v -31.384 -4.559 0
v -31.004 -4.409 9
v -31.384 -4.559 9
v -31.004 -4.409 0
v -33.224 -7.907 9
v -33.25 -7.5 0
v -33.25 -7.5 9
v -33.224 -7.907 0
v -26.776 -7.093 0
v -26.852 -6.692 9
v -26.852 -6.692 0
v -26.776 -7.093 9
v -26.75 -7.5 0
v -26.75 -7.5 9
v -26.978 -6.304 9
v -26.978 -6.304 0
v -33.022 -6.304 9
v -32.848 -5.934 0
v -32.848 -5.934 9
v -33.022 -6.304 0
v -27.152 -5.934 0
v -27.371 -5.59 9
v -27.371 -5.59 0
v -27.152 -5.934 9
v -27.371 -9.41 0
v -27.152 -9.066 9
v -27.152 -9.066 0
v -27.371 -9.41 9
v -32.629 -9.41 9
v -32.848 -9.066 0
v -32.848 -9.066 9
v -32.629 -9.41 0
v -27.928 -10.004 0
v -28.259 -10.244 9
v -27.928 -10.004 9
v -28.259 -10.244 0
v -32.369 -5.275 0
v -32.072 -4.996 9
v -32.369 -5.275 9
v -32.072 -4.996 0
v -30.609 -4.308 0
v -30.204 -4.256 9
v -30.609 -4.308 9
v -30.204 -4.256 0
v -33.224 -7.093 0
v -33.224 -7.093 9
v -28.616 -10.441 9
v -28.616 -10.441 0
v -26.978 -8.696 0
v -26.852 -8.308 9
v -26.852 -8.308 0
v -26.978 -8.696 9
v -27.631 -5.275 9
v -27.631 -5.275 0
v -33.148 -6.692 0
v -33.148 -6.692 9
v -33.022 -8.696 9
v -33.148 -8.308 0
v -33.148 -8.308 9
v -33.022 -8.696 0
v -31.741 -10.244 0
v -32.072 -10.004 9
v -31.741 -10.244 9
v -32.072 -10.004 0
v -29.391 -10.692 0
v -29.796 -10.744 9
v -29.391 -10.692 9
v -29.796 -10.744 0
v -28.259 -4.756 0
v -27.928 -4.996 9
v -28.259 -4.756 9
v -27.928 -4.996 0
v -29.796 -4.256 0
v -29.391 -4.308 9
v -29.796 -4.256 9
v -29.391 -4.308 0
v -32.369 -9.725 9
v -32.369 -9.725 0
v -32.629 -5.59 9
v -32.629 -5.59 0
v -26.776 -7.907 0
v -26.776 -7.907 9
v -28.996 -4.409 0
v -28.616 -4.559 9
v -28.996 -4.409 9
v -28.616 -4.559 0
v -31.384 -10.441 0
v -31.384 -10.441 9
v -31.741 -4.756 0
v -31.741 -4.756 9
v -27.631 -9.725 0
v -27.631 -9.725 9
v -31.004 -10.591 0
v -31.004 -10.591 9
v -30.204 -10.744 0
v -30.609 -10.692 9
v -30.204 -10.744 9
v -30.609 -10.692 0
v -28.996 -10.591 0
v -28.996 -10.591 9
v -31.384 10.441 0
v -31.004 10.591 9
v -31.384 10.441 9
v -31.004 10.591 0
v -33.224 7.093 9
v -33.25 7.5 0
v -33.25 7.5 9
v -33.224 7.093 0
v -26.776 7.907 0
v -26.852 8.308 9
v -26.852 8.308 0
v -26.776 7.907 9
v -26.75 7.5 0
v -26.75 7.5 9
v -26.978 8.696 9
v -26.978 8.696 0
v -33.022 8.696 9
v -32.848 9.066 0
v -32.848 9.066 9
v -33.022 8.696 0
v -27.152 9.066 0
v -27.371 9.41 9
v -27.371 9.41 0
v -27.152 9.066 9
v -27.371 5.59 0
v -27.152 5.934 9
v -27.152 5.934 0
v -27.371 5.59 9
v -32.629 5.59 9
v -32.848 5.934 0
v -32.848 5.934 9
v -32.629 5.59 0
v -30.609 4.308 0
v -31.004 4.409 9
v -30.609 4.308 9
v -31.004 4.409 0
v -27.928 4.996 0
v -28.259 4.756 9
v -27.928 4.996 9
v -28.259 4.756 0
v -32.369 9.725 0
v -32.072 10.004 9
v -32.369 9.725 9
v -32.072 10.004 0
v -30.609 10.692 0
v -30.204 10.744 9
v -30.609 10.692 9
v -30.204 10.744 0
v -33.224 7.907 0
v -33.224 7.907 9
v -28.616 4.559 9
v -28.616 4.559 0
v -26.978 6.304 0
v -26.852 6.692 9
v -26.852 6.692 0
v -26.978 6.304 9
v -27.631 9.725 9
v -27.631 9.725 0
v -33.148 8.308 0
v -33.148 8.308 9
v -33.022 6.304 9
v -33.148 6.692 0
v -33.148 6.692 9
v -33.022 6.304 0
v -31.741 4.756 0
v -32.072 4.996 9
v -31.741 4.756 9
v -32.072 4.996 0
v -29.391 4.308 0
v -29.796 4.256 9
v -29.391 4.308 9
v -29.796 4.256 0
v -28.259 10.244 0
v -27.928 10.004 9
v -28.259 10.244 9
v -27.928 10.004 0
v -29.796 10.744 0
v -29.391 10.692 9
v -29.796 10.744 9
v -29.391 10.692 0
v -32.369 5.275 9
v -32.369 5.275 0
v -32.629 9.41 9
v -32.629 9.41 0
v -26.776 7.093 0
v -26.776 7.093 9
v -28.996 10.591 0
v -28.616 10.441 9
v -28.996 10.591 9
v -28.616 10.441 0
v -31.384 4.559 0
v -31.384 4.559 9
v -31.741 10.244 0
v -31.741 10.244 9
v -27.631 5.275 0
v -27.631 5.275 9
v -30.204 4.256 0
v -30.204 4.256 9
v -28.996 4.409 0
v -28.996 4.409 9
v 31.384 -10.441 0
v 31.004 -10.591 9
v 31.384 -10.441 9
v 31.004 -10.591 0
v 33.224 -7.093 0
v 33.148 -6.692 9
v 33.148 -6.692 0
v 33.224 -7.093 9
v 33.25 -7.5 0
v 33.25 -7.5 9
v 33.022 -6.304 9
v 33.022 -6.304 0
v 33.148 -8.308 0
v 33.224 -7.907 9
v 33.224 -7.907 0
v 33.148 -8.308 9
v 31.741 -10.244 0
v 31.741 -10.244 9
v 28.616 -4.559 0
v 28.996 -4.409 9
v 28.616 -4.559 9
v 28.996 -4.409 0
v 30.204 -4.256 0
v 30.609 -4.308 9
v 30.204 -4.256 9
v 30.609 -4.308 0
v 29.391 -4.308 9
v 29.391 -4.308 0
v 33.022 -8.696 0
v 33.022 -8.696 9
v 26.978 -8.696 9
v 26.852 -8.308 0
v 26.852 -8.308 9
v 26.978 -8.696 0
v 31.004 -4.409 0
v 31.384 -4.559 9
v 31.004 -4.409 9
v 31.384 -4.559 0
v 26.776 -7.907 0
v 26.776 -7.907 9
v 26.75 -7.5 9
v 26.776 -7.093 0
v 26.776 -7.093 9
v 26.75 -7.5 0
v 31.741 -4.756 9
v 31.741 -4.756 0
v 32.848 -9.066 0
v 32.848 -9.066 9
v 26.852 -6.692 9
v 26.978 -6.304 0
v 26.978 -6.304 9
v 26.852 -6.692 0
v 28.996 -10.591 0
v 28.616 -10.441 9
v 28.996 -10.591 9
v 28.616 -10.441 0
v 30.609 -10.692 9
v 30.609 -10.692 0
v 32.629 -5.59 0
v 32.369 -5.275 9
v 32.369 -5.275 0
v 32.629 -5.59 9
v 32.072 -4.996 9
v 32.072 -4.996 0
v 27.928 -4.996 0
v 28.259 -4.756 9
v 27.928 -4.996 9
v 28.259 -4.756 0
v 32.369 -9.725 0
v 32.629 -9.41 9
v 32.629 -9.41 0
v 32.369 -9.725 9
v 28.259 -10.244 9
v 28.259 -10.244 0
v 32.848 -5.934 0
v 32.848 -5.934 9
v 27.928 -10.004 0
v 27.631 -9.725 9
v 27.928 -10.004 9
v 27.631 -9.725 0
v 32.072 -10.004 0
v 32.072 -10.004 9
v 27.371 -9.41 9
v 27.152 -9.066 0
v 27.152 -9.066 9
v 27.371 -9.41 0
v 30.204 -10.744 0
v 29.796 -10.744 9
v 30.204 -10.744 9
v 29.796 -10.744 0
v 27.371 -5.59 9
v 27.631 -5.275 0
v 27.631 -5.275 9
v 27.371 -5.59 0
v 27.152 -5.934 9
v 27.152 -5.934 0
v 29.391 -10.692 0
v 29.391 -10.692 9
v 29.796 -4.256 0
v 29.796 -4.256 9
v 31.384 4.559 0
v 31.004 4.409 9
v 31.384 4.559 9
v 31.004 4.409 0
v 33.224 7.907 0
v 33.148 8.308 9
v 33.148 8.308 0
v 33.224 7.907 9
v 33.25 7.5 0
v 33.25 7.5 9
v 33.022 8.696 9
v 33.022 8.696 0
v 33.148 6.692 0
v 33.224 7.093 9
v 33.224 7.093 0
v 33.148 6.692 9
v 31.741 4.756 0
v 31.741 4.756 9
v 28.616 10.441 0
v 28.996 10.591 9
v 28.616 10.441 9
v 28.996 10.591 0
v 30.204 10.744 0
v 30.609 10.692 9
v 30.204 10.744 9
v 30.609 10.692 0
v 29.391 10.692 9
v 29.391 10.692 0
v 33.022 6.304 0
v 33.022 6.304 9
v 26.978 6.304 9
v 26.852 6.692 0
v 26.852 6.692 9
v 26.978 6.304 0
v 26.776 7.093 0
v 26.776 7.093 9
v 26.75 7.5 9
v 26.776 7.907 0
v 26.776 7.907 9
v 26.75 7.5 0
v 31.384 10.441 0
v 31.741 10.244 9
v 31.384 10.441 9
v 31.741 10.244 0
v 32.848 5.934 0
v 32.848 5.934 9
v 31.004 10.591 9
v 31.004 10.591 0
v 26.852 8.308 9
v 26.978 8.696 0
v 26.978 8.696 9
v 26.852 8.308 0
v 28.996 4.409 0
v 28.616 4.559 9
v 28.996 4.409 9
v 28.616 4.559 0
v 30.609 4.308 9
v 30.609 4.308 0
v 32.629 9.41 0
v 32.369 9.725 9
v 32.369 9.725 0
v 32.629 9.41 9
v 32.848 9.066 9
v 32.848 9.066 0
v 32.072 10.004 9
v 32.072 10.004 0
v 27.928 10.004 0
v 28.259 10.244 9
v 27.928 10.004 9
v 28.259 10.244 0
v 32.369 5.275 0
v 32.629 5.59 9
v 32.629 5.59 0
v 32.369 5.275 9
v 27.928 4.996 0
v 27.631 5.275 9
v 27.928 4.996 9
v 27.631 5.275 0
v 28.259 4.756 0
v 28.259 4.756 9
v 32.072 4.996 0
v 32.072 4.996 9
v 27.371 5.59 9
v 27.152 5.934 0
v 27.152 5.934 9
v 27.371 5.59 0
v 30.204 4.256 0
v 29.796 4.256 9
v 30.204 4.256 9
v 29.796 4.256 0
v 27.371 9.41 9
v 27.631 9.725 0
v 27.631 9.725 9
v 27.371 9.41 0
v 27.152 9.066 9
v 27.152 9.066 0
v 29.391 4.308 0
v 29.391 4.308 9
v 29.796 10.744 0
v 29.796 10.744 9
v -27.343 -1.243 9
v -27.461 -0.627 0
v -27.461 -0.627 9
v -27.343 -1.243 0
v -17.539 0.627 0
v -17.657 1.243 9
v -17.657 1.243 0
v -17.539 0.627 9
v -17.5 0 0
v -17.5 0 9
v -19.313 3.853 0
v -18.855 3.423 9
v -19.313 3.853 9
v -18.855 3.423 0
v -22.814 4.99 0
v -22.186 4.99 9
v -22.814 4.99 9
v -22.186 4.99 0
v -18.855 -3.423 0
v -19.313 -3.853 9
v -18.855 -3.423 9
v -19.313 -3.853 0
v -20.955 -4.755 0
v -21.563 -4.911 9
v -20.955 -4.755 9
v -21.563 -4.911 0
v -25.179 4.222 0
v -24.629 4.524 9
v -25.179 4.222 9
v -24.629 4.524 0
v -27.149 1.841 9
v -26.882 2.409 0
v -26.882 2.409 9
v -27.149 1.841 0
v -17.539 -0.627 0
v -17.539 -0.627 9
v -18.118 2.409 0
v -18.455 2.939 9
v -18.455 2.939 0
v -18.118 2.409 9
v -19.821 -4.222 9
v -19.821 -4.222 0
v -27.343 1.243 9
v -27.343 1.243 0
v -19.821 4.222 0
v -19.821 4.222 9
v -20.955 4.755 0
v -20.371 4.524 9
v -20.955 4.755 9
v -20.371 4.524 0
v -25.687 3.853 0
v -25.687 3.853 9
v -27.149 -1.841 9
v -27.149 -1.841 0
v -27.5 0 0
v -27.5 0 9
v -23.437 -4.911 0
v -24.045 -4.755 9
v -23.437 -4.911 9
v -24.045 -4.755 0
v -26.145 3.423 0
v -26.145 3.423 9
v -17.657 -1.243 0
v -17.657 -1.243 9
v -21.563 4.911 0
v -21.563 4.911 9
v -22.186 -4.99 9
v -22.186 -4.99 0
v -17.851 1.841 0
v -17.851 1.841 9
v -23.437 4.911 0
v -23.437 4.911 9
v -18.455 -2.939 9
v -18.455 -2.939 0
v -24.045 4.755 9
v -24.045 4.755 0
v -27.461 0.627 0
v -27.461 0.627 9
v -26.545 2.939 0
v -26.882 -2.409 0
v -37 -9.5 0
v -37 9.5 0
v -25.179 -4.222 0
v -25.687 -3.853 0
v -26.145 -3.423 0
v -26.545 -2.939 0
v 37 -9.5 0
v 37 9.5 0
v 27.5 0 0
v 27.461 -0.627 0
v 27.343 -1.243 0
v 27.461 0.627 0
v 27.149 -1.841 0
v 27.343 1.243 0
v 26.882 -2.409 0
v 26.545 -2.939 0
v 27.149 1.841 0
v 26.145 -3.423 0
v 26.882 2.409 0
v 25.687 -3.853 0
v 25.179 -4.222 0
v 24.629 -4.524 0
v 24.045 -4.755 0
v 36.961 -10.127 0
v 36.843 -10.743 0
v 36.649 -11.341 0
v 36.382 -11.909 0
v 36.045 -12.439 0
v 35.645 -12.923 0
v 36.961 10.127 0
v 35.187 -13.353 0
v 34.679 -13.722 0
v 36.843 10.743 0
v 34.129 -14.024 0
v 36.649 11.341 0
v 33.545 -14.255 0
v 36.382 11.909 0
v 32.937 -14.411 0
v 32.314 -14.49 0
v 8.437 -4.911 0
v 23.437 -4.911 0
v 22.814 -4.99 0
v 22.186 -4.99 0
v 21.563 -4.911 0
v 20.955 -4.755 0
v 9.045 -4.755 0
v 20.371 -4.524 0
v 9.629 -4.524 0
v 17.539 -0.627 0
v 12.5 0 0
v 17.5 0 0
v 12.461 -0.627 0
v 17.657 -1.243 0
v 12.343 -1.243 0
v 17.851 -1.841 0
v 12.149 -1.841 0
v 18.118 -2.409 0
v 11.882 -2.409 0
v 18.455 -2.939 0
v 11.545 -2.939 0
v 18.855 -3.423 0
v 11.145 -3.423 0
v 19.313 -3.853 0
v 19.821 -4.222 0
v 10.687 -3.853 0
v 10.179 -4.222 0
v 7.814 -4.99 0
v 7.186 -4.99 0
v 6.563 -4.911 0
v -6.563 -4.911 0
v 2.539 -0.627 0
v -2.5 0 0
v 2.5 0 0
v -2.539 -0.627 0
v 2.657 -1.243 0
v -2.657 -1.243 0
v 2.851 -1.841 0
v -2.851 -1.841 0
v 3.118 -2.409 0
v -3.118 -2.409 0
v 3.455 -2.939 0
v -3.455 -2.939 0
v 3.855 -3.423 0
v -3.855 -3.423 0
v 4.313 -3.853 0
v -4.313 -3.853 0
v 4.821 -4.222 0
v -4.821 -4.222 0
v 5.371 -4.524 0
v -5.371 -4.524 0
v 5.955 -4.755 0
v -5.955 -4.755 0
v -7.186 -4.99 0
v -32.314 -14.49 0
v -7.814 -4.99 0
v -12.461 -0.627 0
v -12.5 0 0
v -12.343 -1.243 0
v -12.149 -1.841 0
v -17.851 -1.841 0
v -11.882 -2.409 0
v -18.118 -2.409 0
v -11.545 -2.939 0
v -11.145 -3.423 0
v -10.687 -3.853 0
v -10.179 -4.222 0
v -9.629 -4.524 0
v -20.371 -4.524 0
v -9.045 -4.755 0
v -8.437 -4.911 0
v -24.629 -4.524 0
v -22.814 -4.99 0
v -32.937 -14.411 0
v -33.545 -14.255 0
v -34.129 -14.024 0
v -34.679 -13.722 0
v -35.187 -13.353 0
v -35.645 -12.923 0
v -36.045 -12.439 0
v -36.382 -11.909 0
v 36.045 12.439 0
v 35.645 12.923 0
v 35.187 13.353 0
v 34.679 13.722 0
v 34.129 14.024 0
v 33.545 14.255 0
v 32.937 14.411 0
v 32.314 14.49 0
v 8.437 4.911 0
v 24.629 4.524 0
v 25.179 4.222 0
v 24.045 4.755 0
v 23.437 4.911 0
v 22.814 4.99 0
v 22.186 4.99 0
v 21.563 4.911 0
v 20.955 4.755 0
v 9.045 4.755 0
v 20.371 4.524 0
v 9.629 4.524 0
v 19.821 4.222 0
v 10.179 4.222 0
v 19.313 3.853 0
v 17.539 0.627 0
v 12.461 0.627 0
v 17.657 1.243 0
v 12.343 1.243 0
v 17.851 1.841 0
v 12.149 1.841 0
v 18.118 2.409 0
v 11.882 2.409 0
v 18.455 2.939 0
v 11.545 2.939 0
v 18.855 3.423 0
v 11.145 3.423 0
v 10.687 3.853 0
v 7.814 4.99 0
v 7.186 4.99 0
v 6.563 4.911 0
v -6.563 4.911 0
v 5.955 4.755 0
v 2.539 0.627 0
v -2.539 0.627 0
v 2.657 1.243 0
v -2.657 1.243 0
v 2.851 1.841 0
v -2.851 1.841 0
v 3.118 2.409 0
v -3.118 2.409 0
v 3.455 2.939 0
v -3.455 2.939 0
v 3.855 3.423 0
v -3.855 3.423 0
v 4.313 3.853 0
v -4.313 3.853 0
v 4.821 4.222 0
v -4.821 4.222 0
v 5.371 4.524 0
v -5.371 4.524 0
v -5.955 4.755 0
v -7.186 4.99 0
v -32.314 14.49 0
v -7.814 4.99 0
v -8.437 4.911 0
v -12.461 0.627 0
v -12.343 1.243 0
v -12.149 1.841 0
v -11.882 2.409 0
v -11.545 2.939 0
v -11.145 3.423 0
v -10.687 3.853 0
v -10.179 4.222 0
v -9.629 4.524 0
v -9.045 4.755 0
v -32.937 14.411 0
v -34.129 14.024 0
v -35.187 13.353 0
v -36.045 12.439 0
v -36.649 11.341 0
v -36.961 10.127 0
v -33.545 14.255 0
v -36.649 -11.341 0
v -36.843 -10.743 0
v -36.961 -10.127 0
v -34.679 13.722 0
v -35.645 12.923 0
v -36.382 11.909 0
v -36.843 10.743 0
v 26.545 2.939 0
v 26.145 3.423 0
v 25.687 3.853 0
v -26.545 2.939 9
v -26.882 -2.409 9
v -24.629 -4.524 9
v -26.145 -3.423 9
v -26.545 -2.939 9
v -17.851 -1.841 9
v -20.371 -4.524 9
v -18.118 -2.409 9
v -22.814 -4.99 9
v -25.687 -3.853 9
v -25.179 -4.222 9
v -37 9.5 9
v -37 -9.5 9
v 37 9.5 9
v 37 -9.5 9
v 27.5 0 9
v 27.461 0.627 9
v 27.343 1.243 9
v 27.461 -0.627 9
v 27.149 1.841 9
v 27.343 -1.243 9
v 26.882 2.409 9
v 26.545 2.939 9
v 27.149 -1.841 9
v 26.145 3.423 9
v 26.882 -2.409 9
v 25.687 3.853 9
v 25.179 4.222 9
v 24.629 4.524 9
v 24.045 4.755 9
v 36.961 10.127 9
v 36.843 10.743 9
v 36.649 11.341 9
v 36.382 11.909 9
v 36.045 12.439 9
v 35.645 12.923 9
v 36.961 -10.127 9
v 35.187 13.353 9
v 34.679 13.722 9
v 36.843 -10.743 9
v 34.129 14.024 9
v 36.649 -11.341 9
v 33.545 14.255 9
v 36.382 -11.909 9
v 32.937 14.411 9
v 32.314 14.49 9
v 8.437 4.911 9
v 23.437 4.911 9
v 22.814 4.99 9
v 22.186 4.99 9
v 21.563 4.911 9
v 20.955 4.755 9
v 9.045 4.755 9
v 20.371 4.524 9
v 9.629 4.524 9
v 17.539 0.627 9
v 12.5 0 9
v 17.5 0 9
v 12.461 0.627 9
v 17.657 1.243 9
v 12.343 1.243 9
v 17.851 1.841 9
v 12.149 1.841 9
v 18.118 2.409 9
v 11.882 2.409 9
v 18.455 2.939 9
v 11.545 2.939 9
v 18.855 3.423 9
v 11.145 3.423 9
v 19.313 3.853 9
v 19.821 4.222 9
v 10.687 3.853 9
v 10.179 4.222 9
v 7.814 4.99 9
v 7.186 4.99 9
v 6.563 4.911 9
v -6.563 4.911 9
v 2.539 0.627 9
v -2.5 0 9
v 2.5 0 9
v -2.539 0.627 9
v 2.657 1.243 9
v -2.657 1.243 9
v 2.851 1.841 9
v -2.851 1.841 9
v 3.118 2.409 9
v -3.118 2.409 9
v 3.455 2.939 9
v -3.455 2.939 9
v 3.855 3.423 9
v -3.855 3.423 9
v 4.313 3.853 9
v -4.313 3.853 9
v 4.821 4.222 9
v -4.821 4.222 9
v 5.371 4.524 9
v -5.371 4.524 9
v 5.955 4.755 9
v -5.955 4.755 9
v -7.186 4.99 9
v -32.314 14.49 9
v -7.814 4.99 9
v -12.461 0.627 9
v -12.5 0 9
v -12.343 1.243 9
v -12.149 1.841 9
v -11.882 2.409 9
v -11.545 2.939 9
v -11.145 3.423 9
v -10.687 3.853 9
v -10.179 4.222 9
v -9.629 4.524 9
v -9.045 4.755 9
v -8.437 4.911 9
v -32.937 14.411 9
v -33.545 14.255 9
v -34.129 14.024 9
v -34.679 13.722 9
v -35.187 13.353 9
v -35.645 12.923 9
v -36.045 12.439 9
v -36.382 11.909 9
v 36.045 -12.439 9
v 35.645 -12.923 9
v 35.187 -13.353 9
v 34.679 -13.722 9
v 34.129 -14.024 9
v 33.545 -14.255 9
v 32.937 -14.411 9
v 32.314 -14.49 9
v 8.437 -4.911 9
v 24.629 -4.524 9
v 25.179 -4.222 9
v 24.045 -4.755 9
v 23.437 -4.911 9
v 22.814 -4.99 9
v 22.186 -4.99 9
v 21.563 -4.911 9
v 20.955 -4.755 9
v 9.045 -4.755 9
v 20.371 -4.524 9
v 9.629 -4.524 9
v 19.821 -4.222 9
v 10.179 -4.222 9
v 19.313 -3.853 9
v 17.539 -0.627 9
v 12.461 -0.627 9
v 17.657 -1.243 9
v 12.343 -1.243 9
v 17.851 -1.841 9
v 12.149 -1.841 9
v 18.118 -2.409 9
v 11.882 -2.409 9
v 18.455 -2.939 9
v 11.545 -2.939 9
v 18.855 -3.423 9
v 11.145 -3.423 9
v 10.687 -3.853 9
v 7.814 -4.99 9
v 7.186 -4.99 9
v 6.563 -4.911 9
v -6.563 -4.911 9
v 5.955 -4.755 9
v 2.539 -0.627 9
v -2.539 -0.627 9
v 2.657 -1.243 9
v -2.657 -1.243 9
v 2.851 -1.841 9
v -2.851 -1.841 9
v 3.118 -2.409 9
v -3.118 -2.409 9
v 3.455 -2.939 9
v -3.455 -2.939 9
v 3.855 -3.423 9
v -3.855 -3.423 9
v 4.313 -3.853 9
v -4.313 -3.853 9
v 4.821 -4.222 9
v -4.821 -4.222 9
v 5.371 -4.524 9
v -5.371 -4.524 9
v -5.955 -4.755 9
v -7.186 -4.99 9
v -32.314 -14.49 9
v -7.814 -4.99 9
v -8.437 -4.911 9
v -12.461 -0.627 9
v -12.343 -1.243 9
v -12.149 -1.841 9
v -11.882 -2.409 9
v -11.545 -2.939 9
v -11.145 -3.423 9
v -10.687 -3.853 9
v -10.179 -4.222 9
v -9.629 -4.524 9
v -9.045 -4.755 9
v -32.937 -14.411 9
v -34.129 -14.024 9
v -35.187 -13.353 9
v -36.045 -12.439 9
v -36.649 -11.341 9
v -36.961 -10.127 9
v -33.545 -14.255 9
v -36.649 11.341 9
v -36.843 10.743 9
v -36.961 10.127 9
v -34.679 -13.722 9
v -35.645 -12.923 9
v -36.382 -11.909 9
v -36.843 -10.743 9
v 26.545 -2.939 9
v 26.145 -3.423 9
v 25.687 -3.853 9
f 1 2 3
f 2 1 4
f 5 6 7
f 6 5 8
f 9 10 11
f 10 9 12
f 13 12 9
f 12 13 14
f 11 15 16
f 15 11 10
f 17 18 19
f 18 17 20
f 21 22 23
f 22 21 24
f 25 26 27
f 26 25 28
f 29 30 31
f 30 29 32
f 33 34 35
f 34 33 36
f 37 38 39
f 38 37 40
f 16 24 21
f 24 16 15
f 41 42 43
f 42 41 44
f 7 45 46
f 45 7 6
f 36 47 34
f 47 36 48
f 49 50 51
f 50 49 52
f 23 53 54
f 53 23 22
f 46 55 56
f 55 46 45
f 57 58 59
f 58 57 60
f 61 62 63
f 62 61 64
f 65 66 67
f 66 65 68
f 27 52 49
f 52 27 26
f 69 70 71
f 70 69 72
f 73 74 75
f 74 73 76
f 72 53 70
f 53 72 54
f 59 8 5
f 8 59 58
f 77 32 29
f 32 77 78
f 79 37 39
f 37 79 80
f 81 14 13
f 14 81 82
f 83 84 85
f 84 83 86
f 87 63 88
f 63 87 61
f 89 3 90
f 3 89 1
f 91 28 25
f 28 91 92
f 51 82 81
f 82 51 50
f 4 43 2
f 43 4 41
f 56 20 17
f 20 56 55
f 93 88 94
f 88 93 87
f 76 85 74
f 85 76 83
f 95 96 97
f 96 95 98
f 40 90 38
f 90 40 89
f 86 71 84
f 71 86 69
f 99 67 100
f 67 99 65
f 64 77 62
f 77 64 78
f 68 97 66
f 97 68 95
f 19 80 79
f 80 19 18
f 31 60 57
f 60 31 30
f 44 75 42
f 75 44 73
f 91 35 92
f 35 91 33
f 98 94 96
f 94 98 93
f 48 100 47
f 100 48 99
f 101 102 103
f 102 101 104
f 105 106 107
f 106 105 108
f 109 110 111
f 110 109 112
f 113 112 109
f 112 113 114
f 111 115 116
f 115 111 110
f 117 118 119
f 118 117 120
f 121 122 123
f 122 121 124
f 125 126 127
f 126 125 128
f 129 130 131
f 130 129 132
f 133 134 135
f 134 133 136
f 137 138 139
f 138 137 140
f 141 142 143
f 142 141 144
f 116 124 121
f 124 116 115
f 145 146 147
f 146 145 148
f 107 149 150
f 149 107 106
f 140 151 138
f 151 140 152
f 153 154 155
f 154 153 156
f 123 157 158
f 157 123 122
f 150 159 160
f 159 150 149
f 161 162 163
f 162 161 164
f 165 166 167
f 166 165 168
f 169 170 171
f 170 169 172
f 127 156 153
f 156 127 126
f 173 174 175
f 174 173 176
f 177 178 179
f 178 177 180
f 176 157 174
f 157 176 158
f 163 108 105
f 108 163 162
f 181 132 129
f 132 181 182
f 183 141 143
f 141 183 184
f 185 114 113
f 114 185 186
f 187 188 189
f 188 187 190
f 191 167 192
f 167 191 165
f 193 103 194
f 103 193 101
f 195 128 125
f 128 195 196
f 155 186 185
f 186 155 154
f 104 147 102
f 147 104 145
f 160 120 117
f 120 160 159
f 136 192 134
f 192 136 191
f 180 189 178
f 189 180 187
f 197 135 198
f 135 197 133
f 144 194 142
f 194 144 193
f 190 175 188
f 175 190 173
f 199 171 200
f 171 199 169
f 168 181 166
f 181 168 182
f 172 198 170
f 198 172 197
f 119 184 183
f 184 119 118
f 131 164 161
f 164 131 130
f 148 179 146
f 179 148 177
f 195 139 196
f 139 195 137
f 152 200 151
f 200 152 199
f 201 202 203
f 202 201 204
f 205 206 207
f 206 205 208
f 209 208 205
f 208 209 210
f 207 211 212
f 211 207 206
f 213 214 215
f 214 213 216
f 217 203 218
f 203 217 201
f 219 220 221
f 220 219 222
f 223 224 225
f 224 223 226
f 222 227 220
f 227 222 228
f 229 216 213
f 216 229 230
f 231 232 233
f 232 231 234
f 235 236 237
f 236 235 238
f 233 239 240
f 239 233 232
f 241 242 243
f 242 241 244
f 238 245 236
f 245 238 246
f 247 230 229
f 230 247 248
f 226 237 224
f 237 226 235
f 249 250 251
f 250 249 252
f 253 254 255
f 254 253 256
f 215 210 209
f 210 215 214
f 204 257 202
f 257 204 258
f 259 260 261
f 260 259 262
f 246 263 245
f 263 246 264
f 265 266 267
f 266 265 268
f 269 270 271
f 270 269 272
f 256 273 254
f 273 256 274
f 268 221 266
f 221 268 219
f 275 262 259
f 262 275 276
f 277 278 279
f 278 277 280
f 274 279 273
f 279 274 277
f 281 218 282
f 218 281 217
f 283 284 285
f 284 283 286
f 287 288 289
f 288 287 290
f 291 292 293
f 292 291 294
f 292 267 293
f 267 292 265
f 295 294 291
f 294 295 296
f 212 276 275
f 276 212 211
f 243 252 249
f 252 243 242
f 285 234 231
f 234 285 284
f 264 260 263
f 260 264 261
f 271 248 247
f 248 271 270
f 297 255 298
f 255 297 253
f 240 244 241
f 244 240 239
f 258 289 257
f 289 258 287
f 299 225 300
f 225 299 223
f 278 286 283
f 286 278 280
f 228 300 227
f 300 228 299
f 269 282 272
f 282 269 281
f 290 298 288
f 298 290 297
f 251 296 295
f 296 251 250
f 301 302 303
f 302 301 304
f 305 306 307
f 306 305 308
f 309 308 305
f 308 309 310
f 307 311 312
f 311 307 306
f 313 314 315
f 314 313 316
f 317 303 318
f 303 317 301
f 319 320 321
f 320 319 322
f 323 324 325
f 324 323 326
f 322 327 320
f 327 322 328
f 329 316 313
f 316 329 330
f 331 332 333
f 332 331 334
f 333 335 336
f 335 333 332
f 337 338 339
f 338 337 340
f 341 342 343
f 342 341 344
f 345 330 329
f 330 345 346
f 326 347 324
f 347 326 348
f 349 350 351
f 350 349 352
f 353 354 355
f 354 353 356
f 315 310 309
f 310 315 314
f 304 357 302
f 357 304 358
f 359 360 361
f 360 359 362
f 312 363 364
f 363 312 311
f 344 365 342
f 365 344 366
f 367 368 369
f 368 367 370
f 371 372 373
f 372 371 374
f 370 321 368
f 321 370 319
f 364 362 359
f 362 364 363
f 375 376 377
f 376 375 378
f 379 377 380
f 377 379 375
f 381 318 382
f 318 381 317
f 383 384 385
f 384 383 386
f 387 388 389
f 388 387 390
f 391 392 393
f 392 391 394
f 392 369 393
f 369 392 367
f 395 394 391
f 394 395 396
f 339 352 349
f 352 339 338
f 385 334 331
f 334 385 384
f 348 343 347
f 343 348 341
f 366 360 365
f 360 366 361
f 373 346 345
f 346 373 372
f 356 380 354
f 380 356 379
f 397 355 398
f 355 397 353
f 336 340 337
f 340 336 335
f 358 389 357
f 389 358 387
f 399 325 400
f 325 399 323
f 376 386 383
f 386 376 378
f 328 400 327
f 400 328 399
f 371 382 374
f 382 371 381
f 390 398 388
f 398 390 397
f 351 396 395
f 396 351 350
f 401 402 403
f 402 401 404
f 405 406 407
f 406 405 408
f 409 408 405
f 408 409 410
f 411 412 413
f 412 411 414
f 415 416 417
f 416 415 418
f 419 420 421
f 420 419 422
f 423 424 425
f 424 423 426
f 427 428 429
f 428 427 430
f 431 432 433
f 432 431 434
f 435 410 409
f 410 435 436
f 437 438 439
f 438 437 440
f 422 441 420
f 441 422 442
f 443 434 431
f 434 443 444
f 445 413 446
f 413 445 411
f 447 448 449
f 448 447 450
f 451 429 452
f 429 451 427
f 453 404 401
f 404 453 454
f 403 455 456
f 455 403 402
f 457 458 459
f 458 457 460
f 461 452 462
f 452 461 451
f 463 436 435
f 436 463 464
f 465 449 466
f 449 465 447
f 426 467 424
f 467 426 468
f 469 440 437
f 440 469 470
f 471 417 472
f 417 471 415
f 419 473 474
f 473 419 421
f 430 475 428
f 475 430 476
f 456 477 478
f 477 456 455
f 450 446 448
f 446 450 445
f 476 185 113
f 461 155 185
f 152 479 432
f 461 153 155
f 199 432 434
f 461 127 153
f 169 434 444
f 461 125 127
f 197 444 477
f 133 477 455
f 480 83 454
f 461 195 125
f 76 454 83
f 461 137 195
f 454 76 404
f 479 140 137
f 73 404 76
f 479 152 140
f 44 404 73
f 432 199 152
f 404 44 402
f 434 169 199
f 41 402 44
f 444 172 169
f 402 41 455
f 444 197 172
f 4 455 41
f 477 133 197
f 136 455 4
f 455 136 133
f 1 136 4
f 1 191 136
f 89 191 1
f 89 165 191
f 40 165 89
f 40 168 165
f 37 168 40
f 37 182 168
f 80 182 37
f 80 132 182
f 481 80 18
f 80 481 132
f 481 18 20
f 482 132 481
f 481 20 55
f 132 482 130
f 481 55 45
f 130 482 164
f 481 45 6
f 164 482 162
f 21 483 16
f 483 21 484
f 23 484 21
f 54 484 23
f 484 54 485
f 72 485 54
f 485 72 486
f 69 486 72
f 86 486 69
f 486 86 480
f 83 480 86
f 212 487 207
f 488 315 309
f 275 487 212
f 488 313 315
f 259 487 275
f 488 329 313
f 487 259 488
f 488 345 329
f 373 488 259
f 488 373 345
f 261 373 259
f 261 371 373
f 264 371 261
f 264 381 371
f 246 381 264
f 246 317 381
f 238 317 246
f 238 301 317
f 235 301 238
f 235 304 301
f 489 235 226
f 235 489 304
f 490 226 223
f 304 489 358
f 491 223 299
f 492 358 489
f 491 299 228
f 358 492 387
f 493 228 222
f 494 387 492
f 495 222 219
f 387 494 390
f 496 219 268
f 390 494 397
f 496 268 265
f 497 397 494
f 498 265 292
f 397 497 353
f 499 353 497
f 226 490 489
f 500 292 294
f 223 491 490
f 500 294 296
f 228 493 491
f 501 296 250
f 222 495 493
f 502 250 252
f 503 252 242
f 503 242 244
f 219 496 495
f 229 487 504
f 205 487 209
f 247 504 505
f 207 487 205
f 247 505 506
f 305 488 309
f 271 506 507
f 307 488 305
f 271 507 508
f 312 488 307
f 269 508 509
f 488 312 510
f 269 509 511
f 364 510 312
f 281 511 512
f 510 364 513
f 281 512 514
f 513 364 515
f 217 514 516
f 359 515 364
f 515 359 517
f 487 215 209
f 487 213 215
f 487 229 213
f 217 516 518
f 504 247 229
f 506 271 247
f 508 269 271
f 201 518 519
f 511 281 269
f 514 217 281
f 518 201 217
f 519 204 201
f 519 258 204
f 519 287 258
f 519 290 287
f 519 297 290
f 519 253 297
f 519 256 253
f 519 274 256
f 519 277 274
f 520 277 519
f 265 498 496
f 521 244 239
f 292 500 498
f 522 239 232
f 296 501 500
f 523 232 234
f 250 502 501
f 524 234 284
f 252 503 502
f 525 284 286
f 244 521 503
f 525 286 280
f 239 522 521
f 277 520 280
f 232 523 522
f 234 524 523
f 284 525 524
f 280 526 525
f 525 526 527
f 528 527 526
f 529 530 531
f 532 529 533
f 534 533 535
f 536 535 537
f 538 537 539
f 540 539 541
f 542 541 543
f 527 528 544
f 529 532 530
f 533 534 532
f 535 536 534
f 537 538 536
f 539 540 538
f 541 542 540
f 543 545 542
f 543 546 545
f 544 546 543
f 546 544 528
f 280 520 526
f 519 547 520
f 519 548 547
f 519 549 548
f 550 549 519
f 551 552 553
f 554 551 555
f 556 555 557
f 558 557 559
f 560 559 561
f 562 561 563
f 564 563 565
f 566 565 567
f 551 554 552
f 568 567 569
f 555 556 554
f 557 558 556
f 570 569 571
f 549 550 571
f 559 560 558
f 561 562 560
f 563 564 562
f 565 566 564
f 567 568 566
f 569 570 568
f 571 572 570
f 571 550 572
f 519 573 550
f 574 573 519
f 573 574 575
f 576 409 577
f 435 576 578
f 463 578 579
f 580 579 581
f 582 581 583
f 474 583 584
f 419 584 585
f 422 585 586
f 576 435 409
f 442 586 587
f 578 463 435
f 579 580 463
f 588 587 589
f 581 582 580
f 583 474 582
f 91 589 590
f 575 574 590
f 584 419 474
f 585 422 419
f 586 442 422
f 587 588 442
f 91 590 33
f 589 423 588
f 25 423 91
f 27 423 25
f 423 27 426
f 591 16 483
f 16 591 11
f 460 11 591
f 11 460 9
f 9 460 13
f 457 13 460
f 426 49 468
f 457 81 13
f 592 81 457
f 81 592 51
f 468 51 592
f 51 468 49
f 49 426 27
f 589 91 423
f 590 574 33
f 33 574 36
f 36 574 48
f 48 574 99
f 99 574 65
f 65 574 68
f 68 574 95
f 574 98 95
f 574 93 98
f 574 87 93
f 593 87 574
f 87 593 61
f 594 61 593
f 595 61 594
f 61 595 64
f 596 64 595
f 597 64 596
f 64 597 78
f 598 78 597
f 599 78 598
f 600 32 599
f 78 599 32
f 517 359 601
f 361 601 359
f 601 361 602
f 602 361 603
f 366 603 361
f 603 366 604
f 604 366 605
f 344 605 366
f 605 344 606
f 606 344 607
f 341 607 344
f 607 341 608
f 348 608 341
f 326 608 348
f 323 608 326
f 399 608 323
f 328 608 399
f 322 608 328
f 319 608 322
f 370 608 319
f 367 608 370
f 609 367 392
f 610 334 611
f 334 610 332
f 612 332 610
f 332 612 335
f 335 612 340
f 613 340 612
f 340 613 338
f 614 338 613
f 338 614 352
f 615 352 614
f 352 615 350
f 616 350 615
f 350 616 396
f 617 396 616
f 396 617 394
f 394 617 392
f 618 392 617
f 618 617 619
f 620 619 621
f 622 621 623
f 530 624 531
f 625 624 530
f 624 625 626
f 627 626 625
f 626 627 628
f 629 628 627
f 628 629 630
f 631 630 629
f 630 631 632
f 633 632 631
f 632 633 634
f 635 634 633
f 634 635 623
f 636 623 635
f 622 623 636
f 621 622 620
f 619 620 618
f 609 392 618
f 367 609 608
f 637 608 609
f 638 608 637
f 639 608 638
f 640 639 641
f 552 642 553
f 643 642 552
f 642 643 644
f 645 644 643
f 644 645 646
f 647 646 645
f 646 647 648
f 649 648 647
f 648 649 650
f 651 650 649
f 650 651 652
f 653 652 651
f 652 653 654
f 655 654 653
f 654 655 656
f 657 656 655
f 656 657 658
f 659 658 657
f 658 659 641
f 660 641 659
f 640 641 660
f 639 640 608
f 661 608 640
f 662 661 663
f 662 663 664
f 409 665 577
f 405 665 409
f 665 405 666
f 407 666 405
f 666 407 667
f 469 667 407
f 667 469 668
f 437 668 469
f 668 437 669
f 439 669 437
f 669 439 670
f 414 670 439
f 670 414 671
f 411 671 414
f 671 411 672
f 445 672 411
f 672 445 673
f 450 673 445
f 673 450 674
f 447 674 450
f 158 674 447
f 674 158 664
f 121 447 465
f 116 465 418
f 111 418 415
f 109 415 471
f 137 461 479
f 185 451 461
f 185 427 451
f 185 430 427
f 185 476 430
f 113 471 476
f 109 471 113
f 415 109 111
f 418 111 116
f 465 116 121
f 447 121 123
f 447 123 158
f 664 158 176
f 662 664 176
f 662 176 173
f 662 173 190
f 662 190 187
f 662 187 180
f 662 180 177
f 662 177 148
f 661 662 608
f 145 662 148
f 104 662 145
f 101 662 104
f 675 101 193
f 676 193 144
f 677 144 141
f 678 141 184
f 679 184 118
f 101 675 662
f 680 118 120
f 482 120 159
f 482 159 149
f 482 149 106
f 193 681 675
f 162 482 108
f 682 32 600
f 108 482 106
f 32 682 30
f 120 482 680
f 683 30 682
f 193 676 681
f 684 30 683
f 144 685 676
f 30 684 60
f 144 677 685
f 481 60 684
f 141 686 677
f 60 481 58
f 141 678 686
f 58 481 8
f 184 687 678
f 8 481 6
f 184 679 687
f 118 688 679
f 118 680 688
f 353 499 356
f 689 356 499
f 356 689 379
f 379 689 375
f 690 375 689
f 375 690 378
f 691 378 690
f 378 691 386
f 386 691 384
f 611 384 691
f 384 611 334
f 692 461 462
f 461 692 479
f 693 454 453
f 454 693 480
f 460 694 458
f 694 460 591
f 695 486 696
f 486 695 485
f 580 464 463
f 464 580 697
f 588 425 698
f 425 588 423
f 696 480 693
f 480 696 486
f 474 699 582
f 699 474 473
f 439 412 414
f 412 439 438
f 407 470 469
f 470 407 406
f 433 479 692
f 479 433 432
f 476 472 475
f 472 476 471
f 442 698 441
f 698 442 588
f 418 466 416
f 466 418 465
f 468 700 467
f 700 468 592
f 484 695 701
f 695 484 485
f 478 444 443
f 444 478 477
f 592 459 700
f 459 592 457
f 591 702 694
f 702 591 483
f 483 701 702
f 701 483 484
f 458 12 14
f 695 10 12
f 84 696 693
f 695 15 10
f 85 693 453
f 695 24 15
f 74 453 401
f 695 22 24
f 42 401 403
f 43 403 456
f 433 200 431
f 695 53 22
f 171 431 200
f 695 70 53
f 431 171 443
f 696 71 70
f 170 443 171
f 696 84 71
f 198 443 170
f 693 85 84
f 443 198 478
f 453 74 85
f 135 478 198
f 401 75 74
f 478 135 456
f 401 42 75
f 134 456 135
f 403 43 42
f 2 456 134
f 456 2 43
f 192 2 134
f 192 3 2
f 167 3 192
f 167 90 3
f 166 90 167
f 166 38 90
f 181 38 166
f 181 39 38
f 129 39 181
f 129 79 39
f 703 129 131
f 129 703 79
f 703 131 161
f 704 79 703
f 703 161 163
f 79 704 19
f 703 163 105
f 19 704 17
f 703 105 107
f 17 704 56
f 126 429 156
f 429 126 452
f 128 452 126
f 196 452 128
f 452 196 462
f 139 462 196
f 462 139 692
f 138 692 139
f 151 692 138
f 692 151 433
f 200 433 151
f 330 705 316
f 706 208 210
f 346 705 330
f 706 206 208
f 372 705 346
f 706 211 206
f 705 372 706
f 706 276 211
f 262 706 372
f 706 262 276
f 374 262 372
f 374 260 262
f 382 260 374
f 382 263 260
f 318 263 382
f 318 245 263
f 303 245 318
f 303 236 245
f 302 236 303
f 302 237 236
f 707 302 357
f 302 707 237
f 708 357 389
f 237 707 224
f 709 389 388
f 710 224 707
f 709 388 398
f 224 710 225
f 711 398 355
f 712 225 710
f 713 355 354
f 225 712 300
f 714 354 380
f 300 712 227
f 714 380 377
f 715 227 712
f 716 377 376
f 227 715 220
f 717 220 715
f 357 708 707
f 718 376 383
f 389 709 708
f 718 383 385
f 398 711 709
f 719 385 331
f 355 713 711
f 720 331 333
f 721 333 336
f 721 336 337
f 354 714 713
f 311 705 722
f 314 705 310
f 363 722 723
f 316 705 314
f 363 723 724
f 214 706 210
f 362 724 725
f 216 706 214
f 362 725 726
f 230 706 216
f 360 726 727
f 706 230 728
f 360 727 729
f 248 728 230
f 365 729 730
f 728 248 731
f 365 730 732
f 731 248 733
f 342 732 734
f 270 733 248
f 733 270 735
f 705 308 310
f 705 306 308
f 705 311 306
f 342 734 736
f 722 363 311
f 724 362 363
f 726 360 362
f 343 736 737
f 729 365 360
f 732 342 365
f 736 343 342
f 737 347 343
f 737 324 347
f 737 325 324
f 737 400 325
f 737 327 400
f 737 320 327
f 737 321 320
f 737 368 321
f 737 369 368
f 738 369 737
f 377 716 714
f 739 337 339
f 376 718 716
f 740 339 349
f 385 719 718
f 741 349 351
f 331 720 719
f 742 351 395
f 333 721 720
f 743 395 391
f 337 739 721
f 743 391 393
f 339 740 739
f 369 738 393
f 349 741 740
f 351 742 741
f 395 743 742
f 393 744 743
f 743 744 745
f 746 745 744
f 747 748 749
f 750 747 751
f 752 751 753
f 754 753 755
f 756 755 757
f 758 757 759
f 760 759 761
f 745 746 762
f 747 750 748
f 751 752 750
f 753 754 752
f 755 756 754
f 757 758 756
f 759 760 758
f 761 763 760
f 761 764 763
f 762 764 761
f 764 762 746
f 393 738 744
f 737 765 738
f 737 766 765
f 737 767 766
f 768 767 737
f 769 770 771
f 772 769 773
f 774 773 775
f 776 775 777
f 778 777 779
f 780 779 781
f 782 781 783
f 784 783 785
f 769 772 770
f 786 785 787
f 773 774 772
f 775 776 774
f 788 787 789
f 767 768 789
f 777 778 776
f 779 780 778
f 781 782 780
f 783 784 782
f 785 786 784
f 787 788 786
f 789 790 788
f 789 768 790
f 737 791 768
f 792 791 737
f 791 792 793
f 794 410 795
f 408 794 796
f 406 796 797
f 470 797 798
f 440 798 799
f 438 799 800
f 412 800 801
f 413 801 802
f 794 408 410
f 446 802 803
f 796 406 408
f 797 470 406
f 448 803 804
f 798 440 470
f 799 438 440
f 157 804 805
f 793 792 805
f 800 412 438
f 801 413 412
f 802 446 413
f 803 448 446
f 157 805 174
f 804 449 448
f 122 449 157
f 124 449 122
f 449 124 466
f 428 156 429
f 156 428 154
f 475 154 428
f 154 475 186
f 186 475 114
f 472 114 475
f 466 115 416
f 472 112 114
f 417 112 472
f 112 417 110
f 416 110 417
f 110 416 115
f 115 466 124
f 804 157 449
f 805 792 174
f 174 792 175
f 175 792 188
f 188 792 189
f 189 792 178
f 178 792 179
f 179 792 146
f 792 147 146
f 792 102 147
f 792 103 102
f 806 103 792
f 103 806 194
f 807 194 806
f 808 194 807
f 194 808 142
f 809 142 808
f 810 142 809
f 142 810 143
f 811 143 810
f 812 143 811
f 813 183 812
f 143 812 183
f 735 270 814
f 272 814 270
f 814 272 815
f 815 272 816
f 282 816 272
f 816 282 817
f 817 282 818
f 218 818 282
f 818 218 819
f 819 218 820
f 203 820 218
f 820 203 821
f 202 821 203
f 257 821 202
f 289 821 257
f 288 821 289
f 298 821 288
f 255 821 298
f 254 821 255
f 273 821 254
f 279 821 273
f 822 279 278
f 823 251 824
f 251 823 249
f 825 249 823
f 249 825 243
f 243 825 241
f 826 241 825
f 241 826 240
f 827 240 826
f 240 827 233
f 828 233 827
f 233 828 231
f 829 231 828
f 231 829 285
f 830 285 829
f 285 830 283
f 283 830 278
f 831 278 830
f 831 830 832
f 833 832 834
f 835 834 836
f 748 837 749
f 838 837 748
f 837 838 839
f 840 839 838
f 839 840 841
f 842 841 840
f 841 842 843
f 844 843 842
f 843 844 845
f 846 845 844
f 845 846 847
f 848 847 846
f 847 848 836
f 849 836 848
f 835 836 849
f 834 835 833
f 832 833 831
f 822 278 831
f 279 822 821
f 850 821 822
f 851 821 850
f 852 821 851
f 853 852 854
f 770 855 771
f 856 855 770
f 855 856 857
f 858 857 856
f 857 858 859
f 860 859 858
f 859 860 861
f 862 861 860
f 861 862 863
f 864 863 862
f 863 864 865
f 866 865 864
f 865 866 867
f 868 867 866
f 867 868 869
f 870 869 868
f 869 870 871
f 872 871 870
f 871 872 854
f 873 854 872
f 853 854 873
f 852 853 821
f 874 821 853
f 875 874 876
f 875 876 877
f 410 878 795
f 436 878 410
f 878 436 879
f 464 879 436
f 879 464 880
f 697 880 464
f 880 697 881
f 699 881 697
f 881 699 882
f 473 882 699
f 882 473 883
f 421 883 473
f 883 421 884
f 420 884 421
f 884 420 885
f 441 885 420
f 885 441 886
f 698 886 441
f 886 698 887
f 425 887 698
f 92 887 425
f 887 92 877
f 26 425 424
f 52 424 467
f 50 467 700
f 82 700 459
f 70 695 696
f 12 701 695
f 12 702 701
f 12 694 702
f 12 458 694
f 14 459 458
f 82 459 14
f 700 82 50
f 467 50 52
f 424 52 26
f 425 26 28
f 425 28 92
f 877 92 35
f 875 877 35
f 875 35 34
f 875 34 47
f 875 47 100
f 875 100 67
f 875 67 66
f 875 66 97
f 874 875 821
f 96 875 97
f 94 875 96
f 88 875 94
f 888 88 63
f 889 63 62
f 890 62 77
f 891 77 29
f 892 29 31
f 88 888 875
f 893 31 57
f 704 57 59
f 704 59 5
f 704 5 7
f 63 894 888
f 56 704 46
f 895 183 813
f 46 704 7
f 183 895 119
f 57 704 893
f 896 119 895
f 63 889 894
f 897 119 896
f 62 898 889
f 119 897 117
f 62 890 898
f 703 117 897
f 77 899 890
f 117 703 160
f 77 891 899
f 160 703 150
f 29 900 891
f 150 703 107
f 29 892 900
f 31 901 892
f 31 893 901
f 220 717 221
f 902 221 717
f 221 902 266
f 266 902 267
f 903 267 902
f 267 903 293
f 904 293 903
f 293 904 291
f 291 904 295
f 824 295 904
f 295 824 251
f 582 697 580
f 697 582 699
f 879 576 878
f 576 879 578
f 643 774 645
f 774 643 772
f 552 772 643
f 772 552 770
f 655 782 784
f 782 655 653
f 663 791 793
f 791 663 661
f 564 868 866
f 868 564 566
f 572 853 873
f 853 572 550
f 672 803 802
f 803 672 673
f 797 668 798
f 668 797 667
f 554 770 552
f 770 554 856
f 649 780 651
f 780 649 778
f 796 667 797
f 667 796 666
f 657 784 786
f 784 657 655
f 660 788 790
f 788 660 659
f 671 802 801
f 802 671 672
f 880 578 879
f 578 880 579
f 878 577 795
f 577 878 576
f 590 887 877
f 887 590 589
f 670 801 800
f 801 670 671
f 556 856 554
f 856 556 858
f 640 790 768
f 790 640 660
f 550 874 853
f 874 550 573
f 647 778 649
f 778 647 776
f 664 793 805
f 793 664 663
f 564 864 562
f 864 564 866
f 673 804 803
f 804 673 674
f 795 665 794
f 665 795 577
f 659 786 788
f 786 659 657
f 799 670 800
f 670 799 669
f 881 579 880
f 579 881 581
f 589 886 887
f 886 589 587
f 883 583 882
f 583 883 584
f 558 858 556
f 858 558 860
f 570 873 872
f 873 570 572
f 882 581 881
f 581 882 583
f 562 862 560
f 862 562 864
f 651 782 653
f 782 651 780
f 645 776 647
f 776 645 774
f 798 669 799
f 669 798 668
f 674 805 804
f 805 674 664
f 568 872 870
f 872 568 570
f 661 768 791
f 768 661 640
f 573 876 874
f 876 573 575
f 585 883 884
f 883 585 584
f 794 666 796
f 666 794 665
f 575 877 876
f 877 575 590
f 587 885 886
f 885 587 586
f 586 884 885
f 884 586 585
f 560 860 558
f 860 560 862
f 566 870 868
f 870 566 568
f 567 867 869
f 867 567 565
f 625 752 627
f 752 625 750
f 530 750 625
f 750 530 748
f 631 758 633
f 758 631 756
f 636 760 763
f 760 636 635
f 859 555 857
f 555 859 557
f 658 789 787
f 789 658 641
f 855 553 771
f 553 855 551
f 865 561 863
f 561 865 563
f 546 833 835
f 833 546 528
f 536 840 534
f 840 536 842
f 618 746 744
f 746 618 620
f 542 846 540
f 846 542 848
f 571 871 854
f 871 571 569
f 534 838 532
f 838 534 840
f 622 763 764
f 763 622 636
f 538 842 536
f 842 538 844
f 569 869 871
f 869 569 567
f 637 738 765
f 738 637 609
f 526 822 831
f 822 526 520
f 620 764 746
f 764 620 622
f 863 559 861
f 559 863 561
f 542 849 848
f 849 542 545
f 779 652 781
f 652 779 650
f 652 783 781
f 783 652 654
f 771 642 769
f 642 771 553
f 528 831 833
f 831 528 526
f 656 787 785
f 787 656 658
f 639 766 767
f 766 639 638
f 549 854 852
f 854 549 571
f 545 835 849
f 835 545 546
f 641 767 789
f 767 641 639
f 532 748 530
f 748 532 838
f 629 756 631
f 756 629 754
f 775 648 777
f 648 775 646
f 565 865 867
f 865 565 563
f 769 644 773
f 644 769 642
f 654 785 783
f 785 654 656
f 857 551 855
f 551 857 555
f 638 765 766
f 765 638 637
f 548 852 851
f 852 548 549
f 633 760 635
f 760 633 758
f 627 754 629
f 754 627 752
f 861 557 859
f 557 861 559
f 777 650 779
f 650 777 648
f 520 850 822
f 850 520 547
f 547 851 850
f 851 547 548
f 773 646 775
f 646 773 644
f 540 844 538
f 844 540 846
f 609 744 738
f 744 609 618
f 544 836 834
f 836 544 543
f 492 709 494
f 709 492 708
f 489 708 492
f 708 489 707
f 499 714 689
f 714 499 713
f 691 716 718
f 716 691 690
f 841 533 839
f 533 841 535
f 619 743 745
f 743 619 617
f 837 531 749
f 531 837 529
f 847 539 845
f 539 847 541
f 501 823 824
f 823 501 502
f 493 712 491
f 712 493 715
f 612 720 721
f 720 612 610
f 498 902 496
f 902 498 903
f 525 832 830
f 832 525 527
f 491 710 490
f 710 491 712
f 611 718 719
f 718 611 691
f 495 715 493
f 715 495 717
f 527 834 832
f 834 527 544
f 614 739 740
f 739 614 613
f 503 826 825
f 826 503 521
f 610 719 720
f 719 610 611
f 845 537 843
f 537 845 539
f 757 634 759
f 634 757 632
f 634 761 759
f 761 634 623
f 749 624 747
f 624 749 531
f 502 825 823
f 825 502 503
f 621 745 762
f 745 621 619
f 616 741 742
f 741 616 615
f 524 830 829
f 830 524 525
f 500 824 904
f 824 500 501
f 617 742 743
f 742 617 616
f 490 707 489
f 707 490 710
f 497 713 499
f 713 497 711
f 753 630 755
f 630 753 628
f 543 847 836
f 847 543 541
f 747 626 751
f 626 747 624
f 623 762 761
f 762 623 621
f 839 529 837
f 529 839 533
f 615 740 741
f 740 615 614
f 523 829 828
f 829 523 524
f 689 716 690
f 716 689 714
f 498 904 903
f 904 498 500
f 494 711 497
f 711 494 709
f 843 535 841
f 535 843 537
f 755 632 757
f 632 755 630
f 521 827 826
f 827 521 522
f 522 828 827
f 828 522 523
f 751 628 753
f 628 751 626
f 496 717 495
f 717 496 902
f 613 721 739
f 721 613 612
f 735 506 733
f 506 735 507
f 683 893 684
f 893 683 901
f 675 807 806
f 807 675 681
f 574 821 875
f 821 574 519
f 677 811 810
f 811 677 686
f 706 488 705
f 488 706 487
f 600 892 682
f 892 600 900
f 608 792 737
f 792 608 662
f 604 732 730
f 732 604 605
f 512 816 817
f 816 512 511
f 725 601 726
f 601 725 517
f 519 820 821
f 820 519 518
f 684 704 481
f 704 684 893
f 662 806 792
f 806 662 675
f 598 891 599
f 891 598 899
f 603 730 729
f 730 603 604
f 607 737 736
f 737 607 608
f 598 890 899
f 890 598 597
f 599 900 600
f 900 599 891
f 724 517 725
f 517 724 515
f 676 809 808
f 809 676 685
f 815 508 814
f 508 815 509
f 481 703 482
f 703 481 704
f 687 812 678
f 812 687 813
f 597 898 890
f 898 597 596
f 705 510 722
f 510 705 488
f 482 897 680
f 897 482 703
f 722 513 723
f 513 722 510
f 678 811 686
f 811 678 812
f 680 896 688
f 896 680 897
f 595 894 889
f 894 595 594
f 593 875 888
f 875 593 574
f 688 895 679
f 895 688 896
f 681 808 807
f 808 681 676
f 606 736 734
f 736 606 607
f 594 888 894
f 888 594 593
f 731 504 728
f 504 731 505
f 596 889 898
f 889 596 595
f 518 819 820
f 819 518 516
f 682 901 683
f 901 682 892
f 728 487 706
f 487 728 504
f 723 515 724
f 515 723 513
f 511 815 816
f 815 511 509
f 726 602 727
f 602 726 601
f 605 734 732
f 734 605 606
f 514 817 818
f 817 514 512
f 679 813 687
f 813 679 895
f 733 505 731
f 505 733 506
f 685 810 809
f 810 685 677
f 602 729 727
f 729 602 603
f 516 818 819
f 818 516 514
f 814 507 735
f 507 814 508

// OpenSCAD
$fn = 50;

difference() {
	union() {
		hull() {
			translate(v = [-32.0, 9.5, 0]) {
				cylinder(h = 9, r = 5);
			}
			translate(v = [32.0, 9.5, 0]) {
				cylinder(h = 9, r = 5);
			}
			translate(v = [-32.0, -9.5, 0]) {
				cylinder(h = 9, r = 5);
			}
			translate(v = [32.0, -9.5, 0]) {
				cylinder(h = 9, r = 5);
			}
		}
	}
	union() {
		translate(v = [-30.0, -7.5, -100.0]) {
			cylinder(h = 200, r = 3.25);
		}
		translate(v = [-30.0, 7.5, -100.0]) {
			cylinder(h = 200, r = 3.25);
		}
		translate(v = [30.0, -7.5, -100.0]) {
			cylinder(h = 200, r = 3.25);
		}
		translate(v = [30.0, 7.5, -100.0]) {
			cylinder(h = 200, r = 3.25);
		}
		translate(v = [-30.0, -7.5, -100.0]) {
			cylinder(h = 200, r = 1.8);
		}
		translate(v = [-30.0, 7.5, -100.0]) {
			cylinder(h = 200, r = 1.8);
		}
		translate(v = [30.0, -7.5, -100.0]) {
			cylinder(h = 200, r = 1.8);
		}
		translate(v = [30.0, 7.5, -100.0]) {
			cylinder(h = 200, r = 1.8);
		}
		translate(v = [-22.5, 0, 0.0]) {
			cylinder(h = 9, r = 5.0);
		}
		translate(v = [-7.5, 0, 0.0]) {
			cylinder(h = 9, r = 5.0);
		}
		translate(v = [7.5, 0, 0.0]) {
			cylinder(h = 9, r = 5.0);
		}
		translate(v = [22.5, 0, 0.0]) {
			cylinder(h = 9, r = 5.0);
		}
	}
}
